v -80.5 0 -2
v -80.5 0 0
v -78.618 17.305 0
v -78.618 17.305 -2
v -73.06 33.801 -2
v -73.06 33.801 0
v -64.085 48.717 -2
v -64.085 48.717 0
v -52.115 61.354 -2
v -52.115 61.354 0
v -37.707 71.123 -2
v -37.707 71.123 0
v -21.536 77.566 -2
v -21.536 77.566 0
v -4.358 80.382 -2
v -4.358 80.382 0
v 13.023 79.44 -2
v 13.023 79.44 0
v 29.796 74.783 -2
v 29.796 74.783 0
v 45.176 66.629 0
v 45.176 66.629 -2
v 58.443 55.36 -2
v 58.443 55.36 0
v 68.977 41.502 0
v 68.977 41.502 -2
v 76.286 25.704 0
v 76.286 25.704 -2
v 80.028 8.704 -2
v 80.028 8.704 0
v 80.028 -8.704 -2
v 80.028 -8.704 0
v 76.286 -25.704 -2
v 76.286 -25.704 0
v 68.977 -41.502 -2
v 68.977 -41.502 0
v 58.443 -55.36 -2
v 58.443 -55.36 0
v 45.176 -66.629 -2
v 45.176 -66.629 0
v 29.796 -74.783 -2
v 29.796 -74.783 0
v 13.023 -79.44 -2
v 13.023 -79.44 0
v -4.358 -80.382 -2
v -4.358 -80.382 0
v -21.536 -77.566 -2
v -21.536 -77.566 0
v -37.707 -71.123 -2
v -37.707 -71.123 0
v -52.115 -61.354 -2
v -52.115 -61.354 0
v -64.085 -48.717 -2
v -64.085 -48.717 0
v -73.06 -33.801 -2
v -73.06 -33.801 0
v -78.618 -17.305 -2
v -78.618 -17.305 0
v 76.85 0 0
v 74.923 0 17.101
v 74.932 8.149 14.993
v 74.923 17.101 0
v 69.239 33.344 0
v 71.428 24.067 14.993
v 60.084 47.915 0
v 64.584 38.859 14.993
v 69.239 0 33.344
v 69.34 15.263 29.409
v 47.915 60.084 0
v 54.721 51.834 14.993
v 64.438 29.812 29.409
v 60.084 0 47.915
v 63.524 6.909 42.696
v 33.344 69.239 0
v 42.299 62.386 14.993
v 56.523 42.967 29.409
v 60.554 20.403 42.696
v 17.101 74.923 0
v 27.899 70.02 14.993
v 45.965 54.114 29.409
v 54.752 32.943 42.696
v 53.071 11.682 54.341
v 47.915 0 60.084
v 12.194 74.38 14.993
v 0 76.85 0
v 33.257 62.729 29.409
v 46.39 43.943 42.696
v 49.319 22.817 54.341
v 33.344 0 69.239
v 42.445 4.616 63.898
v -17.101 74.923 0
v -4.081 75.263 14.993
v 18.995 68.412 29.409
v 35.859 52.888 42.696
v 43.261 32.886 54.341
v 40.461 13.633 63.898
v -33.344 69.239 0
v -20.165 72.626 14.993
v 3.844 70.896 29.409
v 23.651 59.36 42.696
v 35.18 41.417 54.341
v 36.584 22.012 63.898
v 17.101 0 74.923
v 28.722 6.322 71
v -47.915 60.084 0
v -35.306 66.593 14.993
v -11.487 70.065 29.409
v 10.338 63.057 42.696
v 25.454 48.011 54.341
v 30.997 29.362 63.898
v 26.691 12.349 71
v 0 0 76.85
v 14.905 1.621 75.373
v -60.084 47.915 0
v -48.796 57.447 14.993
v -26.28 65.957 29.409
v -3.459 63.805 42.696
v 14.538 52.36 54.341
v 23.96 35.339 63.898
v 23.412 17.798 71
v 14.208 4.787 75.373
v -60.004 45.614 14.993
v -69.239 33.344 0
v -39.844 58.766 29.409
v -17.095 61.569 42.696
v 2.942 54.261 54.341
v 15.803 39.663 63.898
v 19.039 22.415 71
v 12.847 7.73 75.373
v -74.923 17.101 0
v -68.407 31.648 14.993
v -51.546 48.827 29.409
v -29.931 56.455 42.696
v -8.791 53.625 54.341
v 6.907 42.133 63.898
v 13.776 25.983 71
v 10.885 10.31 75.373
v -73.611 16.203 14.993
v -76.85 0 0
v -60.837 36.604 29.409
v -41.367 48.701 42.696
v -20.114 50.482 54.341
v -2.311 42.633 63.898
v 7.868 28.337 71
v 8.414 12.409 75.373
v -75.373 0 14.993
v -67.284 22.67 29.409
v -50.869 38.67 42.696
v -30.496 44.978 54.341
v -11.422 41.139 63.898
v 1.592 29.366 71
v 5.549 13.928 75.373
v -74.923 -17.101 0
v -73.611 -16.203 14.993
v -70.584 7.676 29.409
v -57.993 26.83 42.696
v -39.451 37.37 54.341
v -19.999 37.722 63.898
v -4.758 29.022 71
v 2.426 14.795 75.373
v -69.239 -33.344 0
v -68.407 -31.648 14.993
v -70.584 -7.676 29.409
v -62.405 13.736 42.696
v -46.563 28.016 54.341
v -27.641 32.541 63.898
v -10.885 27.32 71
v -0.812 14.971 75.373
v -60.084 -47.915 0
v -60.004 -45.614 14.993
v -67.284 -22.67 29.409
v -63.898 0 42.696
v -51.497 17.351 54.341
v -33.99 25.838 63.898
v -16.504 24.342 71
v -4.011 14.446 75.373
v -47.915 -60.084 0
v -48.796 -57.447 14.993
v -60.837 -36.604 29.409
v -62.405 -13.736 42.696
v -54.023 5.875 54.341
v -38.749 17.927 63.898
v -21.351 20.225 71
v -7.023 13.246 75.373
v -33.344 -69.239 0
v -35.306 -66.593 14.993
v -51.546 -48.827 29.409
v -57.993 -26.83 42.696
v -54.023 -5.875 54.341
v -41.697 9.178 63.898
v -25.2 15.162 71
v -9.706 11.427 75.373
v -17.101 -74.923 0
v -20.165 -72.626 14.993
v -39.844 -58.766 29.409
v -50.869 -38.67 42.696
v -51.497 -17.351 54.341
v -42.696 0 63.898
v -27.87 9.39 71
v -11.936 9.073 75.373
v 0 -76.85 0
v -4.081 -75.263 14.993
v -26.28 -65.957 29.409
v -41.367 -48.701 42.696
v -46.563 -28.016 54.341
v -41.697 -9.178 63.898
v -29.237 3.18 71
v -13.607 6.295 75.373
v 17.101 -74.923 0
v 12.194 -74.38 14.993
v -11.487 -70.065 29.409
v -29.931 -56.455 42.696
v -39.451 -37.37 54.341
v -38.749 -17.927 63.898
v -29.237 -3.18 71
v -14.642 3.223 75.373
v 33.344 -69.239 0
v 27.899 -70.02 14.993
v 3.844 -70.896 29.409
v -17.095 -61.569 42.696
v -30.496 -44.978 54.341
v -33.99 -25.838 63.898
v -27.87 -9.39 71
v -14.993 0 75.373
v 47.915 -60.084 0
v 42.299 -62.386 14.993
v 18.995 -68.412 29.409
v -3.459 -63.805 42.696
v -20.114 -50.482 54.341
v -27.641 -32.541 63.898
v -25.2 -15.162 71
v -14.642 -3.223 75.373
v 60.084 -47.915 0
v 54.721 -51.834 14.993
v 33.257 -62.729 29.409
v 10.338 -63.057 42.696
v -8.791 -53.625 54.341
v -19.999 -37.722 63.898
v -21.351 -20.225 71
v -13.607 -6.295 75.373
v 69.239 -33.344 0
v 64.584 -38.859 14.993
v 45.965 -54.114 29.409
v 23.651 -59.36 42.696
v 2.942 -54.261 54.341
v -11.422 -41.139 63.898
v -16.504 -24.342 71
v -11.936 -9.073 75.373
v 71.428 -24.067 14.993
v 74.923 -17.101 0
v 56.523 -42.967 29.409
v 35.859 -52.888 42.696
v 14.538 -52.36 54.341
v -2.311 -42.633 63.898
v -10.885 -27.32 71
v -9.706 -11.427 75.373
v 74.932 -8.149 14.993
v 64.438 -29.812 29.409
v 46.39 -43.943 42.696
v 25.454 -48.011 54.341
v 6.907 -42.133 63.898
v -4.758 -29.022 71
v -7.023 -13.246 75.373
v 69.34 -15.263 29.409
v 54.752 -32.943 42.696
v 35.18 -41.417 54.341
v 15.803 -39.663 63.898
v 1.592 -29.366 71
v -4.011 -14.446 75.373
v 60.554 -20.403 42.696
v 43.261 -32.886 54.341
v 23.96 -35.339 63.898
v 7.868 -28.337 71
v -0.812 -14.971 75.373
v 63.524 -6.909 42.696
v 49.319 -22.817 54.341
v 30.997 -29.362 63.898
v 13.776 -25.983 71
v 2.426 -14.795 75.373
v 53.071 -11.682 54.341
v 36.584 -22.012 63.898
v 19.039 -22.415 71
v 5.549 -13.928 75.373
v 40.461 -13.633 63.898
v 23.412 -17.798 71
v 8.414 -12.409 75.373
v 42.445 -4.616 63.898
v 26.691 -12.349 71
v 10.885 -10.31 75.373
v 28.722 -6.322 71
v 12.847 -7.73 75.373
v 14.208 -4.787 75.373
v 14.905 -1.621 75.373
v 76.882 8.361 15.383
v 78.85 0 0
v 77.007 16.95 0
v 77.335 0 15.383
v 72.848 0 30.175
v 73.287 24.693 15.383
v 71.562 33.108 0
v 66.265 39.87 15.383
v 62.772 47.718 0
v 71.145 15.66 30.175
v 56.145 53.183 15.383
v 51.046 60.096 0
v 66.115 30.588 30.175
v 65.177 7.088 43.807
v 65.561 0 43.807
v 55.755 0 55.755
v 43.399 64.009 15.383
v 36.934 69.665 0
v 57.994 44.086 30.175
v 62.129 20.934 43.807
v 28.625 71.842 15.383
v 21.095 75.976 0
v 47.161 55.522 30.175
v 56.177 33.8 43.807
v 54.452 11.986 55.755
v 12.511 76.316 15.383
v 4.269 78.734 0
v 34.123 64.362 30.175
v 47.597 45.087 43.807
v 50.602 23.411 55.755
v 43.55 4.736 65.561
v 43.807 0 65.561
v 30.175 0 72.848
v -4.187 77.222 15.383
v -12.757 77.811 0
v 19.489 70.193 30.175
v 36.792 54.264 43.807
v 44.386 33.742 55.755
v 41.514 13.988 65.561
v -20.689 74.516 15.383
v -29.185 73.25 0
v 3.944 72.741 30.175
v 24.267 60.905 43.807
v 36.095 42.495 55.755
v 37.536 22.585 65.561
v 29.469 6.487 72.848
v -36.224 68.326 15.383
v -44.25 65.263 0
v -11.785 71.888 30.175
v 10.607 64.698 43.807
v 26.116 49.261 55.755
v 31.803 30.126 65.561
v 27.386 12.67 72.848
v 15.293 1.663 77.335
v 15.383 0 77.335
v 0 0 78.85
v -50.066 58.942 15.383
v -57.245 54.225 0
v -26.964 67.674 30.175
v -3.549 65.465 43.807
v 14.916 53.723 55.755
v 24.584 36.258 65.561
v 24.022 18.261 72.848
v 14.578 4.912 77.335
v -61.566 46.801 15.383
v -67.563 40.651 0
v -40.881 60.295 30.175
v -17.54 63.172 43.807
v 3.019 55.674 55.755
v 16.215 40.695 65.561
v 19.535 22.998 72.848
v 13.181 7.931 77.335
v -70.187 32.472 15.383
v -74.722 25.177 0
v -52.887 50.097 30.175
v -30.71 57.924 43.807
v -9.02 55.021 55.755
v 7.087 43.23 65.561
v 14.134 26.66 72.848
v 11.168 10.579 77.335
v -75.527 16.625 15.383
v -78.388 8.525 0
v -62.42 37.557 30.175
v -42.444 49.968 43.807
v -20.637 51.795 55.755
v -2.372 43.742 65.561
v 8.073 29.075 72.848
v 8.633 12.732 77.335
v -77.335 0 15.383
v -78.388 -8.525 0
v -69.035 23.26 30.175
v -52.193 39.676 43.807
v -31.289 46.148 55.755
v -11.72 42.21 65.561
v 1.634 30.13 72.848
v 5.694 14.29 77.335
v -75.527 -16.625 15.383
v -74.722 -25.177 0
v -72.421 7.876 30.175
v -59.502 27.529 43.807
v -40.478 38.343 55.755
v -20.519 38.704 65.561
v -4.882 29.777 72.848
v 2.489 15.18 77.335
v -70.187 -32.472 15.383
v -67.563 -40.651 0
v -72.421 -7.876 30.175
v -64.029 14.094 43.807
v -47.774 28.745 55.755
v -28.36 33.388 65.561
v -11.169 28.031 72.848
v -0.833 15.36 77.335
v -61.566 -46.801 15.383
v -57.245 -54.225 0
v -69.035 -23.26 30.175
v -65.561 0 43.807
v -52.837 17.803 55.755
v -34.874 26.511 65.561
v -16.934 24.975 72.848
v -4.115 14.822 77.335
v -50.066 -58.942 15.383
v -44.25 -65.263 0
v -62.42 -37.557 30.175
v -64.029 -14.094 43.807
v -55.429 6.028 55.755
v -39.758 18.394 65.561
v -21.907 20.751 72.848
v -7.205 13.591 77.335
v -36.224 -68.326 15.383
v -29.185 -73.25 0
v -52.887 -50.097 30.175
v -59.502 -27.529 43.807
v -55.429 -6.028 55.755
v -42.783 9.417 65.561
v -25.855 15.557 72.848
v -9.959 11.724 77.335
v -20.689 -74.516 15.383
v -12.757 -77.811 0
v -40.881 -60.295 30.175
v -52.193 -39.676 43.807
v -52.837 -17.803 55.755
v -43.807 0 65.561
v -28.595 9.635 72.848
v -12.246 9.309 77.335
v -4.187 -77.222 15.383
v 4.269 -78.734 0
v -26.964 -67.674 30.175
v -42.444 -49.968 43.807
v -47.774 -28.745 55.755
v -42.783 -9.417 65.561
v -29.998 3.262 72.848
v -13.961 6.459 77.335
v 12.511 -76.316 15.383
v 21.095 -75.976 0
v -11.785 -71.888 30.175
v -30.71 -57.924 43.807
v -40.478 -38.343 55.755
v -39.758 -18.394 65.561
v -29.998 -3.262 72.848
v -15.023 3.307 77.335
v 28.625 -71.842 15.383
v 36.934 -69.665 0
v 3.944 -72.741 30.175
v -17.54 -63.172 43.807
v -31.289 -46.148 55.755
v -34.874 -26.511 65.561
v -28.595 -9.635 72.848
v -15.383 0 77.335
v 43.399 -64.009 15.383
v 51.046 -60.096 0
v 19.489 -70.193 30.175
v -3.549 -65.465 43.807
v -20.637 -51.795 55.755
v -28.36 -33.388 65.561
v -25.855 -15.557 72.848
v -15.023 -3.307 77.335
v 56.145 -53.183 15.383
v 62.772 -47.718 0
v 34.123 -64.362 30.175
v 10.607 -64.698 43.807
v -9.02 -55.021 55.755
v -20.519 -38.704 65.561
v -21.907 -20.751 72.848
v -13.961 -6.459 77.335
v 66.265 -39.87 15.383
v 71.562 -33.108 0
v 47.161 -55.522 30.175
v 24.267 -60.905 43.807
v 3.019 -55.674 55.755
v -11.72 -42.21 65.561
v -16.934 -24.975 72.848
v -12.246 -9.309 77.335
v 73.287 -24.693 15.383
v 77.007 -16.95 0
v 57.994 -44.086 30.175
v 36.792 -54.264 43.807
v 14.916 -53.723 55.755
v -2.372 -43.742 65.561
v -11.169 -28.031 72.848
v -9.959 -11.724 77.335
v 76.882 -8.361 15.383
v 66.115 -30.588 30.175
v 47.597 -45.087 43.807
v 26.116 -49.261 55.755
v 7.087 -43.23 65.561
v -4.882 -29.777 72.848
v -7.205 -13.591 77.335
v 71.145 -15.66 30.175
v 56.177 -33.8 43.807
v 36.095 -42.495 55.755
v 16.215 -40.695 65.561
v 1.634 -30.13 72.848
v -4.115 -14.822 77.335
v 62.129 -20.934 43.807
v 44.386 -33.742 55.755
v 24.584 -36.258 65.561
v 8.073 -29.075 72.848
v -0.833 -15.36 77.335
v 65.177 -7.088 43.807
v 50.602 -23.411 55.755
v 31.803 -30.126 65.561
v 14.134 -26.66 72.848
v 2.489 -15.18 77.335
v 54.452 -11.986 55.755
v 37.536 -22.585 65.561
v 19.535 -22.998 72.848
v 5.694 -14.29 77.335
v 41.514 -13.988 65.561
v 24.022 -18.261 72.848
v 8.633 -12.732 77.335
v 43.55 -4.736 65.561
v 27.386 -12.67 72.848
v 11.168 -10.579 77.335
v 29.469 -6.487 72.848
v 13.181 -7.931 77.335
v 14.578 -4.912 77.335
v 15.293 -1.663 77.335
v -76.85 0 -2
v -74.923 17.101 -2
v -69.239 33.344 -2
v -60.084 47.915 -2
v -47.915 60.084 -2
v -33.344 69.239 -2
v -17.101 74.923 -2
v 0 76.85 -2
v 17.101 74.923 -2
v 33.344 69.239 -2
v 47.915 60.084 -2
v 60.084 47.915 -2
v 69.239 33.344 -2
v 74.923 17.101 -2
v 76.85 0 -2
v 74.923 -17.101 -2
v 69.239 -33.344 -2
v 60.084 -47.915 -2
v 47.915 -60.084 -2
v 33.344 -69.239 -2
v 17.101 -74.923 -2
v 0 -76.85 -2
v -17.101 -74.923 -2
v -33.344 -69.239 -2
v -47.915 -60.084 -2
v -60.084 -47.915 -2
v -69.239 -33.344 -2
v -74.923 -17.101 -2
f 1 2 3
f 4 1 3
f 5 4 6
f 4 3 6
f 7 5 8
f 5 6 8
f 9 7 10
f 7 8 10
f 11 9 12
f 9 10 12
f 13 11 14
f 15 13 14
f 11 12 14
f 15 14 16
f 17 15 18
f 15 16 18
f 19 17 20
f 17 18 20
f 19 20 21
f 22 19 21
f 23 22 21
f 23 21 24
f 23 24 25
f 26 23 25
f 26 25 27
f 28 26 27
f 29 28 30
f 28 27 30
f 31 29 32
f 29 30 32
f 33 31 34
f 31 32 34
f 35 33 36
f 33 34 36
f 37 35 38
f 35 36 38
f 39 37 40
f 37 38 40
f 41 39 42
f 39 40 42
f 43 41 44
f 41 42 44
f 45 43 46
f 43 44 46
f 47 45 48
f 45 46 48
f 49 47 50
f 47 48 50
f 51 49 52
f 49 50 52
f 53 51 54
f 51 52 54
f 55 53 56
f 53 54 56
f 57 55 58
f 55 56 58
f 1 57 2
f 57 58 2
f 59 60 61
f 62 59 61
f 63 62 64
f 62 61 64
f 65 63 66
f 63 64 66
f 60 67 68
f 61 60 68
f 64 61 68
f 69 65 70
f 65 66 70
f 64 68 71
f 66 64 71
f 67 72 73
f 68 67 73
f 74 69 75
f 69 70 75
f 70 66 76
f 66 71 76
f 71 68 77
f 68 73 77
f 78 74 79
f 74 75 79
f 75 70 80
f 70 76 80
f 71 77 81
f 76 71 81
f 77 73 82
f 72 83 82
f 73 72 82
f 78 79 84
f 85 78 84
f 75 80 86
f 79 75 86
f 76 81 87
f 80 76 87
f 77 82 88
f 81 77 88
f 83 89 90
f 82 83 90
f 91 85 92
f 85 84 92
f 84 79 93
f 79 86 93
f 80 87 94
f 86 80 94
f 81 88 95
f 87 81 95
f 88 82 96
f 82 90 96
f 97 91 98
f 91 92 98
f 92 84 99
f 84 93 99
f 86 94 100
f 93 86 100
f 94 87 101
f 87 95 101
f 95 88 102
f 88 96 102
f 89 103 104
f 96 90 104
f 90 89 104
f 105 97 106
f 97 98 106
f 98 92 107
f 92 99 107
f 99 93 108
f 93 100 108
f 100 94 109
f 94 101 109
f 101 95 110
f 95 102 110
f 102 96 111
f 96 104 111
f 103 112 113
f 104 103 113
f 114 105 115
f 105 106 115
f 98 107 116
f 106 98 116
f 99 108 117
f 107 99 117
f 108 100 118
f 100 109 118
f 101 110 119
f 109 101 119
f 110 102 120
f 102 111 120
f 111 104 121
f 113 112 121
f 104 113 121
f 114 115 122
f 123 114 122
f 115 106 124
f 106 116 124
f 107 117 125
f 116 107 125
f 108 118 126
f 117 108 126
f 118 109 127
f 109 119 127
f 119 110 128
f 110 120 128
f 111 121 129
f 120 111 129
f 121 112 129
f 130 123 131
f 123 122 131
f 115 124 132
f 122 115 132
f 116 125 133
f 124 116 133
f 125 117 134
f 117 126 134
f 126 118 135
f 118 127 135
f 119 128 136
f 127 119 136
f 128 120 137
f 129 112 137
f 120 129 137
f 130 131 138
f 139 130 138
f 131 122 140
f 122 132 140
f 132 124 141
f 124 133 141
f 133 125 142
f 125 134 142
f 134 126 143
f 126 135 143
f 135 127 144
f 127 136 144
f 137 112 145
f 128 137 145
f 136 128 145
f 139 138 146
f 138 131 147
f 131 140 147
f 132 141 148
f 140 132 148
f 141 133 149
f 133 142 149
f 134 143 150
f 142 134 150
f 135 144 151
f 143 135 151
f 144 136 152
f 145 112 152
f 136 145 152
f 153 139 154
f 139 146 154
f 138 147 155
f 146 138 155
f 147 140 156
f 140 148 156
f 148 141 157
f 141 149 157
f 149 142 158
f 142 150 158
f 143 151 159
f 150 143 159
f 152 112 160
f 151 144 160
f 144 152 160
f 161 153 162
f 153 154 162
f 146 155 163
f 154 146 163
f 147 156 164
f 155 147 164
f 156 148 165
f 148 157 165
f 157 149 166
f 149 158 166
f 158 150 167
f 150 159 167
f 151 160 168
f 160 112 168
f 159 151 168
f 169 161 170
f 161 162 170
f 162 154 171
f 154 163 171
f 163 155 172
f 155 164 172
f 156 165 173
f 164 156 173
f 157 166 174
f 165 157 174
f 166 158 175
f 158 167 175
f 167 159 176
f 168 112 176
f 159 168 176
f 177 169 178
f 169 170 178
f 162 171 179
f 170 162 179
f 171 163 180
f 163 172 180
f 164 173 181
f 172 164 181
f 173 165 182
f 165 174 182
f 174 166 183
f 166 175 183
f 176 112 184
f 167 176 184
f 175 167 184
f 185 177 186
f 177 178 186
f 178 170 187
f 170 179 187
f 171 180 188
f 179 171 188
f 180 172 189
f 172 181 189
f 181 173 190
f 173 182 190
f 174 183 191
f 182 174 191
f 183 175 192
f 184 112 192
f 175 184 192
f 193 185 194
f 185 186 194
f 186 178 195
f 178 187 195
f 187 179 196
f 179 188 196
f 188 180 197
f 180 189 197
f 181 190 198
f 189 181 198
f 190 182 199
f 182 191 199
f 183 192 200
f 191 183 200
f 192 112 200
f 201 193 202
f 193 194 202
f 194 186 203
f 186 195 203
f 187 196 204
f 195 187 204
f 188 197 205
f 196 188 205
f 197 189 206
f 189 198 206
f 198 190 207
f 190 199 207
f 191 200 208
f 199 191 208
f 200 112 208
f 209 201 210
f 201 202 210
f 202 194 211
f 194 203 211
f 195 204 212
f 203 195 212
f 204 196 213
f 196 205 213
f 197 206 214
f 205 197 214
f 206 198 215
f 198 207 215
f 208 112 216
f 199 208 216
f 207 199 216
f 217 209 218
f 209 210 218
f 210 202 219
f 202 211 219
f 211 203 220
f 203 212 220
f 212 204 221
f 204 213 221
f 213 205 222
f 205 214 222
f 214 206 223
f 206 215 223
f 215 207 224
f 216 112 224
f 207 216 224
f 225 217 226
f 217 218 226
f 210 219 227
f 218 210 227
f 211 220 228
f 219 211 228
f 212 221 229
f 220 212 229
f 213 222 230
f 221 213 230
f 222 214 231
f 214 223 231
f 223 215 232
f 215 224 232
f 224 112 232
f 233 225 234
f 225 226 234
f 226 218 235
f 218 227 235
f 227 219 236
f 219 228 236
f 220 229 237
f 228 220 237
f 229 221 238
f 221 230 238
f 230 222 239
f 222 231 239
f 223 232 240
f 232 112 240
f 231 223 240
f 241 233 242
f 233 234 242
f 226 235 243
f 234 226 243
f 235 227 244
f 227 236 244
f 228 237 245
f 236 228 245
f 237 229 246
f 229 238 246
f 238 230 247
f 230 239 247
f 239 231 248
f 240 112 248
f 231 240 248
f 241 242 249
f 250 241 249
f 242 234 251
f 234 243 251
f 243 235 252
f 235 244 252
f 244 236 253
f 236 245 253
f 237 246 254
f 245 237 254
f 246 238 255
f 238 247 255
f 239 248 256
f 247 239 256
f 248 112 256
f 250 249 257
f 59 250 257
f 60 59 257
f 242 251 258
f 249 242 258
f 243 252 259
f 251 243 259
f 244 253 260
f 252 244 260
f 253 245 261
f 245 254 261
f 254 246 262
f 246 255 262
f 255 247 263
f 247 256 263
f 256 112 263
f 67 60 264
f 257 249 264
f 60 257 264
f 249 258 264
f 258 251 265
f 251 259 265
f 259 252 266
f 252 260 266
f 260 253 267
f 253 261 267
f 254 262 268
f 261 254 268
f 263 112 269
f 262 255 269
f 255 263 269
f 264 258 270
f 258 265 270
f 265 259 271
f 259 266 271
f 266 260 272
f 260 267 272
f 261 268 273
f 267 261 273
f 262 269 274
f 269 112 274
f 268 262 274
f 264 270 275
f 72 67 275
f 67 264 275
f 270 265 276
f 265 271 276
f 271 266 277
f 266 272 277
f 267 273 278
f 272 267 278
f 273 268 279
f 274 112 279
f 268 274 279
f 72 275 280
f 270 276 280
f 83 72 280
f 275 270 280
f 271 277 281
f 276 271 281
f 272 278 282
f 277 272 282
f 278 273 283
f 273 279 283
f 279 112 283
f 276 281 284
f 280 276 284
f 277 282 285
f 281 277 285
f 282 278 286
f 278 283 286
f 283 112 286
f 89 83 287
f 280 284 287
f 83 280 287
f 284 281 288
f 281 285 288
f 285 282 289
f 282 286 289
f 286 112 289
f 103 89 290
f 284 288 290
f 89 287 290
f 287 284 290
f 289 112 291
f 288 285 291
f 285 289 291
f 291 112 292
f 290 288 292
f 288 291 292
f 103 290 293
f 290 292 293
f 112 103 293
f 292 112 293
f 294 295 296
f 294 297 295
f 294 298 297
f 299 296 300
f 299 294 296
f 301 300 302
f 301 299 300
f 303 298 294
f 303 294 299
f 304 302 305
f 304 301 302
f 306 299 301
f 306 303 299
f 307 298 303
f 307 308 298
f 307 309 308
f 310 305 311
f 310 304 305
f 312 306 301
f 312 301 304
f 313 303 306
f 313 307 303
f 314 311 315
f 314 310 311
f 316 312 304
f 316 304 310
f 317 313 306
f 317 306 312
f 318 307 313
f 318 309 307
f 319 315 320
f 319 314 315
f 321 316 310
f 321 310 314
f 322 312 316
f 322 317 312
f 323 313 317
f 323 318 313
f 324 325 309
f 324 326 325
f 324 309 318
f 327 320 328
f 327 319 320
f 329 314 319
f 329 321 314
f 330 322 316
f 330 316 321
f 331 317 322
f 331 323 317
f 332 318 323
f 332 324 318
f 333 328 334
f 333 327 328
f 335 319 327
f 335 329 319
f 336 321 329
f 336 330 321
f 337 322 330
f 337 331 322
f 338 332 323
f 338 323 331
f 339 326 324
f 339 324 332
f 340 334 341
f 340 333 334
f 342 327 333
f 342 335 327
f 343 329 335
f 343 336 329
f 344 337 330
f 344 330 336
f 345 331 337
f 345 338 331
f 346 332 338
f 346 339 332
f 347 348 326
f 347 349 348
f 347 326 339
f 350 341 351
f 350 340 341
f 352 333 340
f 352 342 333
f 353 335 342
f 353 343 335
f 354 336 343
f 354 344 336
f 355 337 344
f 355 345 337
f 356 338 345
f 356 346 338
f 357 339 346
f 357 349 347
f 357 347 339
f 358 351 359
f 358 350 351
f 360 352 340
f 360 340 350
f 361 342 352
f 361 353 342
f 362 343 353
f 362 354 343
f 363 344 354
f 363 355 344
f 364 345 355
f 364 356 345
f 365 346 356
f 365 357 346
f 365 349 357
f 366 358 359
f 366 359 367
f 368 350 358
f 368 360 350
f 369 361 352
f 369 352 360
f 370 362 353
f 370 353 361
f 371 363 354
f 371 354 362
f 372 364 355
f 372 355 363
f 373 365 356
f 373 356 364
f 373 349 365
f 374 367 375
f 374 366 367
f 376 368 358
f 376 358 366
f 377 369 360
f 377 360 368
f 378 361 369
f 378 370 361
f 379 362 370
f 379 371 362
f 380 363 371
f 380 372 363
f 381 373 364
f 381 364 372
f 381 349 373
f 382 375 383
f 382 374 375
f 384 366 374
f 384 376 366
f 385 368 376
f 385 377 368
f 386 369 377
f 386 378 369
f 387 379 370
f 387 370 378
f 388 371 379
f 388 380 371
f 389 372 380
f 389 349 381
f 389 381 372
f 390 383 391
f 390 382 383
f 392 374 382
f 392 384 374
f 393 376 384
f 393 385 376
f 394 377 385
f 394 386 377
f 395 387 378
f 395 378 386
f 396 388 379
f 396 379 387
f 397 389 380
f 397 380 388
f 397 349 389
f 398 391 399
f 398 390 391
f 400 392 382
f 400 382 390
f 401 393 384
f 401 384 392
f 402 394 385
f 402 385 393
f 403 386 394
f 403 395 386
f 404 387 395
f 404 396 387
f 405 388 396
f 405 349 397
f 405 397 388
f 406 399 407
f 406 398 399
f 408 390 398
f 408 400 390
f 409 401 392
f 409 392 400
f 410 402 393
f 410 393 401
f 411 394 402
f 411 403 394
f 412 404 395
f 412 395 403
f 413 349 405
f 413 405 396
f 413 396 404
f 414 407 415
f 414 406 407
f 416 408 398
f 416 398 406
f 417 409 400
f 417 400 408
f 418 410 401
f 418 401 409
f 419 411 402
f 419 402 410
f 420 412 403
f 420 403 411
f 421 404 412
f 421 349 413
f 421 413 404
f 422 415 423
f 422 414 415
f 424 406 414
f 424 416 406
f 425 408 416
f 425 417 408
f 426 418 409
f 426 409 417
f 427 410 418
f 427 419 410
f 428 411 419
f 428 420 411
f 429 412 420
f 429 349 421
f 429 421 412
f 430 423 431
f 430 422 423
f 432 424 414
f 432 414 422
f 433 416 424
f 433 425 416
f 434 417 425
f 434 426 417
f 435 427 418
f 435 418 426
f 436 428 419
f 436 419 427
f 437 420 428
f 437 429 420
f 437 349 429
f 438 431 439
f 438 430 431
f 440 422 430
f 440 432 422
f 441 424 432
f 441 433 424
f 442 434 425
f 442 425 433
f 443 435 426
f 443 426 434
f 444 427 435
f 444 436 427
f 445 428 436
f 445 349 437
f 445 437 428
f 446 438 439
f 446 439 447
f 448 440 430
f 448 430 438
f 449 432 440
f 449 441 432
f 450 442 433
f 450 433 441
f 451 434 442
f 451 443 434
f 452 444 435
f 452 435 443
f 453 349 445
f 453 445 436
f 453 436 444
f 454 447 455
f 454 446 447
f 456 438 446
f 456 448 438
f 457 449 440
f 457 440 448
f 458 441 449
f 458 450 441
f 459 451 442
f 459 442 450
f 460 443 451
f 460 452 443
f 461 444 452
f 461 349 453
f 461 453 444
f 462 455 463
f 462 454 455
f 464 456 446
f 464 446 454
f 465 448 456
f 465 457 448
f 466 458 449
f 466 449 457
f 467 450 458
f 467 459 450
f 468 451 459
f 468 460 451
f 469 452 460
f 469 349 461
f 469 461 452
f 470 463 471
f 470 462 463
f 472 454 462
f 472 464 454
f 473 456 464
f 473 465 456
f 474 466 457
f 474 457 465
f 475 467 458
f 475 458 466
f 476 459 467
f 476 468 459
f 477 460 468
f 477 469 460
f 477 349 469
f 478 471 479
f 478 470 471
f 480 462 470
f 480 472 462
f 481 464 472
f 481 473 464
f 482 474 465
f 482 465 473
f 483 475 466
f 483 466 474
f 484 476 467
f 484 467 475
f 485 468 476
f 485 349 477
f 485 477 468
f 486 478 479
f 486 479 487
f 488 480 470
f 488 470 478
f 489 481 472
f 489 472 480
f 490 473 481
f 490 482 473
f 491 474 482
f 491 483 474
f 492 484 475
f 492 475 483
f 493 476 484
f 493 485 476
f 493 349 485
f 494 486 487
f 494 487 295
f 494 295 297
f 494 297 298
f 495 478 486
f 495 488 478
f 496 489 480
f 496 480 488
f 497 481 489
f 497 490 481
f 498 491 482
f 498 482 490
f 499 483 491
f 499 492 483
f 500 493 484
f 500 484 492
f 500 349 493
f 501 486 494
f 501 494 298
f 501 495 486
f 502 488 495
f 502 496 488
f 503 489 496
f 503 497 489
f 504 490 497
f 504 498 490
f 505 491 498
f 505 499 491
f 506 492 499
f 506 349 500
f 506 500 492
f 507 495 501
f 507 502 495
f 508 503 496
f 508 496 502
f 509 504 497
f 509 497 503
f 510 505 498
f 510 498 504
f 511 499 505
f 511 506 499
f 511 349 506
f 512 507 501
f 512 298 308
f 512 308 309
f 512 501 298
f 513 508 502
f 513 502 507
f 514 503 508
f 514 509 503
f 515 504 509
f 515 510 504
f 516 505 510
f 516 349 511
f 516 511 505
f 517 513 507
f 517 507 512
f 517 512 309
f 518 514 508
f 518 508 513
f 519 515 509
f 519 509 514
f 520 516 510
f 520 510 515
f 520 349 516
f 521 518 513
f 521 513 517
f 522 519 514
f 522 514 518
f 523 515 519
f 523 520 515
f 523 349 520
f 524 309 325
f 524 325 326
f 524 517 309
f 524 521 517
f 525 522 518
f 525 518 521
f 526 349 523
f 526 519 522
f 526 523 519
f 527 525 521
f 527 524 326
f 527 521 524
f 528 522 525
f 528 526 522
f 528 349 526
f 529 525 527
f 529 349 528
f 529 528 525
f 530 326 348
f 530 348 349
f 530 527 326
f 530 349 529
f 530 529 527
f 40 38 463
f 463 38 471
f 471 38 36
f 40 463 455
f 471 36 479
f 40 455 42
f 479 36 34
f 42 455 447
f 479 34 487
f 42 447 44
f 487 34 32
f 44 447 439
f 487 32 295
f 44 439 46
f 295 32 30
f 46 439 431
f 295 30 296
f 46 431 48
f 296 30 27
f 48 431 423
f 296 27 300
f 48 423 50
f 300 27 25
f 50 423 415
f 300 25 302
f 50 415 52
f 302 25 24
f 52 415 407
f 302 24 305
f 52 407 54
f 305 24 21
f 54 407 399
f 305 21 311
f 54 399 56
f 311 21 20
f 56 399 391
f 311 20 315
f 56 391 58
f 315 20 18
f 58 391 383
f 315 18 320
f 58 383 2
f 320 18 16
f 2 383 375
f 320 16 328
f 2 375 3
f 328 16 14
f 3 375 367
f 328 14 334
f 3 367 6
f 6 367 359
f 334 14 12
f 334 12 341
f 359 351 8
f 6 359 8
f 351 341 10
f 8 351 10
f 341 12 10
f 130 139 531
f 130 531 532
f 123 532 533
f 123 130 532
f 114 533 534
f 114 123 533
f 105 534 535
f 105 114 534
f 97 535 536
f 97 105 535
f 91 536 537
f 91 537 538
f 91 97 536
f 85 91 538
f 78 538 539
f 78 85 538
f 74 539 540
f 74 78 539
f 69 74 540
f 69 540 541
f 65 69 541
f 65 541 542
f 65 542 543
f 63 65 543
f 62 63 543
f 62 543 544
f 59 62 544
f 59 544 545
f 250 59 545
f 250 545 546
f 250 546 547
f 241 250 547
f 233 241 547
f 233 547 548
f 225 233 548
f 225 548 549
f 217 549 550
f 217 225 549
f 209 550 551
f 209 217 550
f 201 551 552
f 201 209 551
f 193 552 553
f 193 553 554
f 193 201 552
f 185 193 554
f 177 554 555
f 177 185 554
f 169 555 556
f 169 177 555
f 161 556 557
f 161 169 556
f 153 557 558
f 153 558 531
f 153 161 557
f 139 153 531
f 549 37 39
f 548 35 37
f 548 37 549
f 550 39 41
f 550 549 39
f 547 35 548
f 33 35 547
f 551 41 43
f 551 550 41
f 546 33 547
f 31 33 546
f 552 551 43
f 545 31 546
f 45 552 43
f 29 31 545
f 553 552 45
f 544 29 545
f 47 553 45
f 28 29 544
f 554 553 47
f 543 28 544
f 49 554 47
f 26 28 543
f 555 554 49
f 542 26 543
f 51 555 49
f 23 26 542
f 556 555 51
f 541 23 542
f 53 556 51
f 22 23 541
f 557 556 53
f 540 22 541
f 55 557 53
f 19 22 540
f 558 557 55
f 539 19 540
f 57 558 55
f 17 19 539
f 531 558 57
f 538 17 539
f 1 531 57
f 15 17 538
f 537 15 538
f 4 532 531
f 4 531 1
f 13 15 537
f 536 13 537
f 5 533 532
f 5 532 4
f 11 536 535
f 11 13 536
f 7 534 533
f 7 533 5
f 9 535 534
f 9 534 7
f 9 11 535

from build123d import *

# Parameters (mm, degrees)
SHELL1_T            = -2
SKETCH2_R           = 80.5
SKETCH2_R_2         = 76.85
BOSS_EXTRUDE1_DEPTH = 2


# Read off the part's stored shape, not the designer's step: Revolve1
with BuildPart() as part:
    # Revolve1 outline → Revolve1 (revolve)
    with BuildSketch(Plane.XZ):
        with BuildLine():
            Line((0, 0), (78.85, -7.9e-08))
            ThreePointArc((78.85, -7.9e-08), (55.755369724, 55.755369669), (0, 78.85))
            Line((0, 78.85), (0, 0))
        make_face()
    revolve(axis=Axis((0, 0, 0), (0, 0, 1)))

    # Shell1
    shell1_openings = [part.faces().sort_by_distance(p)[0] for p in [
        (0, 0, 0),
    ]]
    offset(amount=SHELL1_T, openings=shell1_openings, kind=Kind.INTERSECTION)

    # Sketch2 → Boss-Extrude1 (add)
    with BuildSketch(Plane(origin=(0, 0, 0), x_dir=(-1, 0, 0), z_dir=(0, 0, -1))):
        Circle(SKETCH2_R)
        Circle(SKETCH2_R_2, mode=Mode.SUBTRACT)
    extrude(amount=BOSS_EXTRUDE1_DEPTH)


solid = part.part
